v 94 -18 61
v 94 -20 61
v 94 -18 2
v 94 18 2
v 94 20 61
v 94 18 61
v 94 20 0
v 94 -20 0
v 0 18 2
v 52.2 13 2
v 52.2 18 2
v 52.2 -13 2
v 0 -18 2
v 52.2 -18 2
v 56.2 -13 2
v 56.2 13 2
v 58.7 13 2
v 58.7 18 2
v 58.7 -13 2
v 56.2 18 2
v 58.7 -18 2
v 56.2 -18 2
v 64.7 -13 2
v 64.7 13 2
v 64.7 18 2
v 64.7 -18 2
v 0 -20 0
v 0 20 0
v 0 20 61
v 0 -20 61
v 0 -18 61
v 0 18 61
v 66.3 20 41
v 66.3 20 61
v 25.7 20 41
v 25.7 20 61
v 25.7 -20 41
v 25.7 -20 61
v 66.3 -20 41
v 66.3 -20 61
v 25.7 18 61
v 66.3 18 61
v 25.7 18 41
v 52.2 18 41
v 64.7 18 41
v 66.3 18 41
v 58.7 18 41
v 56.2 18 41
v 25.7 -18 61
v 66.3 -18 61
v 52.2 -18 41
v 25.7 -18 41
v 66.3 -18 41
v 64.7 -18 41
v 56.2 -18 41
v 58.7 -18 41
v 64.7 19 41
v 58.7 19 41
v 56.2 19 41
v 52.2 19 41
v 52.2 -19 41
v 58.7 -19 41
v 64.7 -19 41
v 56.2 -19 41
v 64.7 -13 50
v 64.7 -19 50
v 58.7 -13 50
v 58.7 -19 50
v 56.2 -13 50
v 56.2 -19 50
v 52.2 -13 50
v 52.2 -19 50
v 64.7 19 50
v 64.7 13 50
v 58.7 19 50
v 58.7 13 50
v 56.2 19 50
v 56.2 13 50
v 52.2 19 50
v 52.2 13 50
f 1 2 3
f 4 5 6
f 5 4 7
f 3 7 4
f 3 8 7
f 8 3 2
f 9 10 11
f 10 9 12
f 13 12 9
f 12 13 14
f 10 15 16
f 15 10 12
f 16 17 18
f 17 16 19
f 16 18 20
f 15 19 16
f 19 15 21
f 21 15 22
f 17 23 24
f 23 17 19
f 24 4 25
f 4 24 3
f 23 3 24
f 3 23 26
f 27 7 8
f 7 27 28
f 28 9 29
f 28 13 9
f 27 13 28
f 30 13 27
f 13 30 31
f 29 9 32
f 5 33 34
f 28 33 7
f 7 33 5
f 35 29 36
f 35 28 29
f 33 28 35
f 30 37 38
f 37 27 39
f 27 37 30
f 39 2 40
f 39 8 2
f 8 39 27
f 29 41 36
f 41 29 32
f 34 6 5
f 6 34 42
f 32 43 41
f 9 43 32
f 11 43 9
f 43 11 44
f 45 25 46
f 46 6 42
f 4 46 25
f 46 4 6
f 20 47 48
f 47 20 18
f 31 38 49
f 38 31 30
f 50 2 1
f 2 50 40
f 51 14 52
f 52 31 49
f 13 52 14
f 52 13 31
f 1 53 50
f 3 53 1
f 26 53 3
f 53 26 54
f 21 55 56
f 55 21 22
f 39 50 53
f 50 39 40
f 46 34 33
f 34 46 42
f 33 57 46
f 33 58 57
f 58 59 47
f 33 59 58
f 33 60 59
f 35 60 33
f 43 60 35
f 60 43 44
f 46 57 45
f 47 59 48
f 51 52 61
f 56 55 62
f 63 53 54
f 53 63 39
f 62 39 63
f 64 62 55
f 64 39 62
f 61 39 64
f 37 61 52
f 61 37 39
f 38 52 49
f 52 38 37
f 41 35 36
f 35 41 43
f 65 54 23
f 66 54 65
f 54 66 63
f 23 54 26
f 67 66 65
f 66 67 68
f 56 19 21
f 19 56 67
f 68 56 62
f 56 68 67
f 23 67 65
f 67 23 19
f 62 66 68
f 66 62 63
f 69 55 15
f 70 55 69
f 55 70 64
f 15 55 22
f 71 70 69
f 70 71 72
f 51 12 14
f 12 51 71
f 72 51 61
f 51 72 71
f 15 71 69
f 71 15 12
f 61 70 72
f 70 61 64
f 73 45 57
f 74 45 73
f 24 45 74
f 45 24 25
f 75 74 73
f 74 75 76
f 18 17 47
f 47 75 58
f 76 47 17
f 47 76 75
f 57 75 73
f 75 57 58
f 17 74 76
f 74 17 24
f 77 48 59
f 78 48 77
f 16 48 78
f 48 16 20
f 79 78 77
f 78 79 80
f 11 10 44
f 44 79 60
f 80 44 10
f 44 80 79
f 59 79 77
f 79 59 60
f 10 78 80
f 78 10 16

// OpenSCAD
difference()
{
    union()
    {
        translate([0,-20,0])
            cube([94,40,2]);
        translate([0,18,0])
            cube([94,2,61]);
        translate([0,-20,0])
            cube([94,2,61]);
    }
    translate([25.7,-21,41])
        cube([40.6,42,21]);
}
translate([58.7,-19,0])
    cube([6,6,50]);
translate([52.2,-19,0])
    cube([4,6,50]);

translate([58.7,13,0])
    cube([6,6,50]);
translate([52.2,13,0])
    cube([4,6,50]);
